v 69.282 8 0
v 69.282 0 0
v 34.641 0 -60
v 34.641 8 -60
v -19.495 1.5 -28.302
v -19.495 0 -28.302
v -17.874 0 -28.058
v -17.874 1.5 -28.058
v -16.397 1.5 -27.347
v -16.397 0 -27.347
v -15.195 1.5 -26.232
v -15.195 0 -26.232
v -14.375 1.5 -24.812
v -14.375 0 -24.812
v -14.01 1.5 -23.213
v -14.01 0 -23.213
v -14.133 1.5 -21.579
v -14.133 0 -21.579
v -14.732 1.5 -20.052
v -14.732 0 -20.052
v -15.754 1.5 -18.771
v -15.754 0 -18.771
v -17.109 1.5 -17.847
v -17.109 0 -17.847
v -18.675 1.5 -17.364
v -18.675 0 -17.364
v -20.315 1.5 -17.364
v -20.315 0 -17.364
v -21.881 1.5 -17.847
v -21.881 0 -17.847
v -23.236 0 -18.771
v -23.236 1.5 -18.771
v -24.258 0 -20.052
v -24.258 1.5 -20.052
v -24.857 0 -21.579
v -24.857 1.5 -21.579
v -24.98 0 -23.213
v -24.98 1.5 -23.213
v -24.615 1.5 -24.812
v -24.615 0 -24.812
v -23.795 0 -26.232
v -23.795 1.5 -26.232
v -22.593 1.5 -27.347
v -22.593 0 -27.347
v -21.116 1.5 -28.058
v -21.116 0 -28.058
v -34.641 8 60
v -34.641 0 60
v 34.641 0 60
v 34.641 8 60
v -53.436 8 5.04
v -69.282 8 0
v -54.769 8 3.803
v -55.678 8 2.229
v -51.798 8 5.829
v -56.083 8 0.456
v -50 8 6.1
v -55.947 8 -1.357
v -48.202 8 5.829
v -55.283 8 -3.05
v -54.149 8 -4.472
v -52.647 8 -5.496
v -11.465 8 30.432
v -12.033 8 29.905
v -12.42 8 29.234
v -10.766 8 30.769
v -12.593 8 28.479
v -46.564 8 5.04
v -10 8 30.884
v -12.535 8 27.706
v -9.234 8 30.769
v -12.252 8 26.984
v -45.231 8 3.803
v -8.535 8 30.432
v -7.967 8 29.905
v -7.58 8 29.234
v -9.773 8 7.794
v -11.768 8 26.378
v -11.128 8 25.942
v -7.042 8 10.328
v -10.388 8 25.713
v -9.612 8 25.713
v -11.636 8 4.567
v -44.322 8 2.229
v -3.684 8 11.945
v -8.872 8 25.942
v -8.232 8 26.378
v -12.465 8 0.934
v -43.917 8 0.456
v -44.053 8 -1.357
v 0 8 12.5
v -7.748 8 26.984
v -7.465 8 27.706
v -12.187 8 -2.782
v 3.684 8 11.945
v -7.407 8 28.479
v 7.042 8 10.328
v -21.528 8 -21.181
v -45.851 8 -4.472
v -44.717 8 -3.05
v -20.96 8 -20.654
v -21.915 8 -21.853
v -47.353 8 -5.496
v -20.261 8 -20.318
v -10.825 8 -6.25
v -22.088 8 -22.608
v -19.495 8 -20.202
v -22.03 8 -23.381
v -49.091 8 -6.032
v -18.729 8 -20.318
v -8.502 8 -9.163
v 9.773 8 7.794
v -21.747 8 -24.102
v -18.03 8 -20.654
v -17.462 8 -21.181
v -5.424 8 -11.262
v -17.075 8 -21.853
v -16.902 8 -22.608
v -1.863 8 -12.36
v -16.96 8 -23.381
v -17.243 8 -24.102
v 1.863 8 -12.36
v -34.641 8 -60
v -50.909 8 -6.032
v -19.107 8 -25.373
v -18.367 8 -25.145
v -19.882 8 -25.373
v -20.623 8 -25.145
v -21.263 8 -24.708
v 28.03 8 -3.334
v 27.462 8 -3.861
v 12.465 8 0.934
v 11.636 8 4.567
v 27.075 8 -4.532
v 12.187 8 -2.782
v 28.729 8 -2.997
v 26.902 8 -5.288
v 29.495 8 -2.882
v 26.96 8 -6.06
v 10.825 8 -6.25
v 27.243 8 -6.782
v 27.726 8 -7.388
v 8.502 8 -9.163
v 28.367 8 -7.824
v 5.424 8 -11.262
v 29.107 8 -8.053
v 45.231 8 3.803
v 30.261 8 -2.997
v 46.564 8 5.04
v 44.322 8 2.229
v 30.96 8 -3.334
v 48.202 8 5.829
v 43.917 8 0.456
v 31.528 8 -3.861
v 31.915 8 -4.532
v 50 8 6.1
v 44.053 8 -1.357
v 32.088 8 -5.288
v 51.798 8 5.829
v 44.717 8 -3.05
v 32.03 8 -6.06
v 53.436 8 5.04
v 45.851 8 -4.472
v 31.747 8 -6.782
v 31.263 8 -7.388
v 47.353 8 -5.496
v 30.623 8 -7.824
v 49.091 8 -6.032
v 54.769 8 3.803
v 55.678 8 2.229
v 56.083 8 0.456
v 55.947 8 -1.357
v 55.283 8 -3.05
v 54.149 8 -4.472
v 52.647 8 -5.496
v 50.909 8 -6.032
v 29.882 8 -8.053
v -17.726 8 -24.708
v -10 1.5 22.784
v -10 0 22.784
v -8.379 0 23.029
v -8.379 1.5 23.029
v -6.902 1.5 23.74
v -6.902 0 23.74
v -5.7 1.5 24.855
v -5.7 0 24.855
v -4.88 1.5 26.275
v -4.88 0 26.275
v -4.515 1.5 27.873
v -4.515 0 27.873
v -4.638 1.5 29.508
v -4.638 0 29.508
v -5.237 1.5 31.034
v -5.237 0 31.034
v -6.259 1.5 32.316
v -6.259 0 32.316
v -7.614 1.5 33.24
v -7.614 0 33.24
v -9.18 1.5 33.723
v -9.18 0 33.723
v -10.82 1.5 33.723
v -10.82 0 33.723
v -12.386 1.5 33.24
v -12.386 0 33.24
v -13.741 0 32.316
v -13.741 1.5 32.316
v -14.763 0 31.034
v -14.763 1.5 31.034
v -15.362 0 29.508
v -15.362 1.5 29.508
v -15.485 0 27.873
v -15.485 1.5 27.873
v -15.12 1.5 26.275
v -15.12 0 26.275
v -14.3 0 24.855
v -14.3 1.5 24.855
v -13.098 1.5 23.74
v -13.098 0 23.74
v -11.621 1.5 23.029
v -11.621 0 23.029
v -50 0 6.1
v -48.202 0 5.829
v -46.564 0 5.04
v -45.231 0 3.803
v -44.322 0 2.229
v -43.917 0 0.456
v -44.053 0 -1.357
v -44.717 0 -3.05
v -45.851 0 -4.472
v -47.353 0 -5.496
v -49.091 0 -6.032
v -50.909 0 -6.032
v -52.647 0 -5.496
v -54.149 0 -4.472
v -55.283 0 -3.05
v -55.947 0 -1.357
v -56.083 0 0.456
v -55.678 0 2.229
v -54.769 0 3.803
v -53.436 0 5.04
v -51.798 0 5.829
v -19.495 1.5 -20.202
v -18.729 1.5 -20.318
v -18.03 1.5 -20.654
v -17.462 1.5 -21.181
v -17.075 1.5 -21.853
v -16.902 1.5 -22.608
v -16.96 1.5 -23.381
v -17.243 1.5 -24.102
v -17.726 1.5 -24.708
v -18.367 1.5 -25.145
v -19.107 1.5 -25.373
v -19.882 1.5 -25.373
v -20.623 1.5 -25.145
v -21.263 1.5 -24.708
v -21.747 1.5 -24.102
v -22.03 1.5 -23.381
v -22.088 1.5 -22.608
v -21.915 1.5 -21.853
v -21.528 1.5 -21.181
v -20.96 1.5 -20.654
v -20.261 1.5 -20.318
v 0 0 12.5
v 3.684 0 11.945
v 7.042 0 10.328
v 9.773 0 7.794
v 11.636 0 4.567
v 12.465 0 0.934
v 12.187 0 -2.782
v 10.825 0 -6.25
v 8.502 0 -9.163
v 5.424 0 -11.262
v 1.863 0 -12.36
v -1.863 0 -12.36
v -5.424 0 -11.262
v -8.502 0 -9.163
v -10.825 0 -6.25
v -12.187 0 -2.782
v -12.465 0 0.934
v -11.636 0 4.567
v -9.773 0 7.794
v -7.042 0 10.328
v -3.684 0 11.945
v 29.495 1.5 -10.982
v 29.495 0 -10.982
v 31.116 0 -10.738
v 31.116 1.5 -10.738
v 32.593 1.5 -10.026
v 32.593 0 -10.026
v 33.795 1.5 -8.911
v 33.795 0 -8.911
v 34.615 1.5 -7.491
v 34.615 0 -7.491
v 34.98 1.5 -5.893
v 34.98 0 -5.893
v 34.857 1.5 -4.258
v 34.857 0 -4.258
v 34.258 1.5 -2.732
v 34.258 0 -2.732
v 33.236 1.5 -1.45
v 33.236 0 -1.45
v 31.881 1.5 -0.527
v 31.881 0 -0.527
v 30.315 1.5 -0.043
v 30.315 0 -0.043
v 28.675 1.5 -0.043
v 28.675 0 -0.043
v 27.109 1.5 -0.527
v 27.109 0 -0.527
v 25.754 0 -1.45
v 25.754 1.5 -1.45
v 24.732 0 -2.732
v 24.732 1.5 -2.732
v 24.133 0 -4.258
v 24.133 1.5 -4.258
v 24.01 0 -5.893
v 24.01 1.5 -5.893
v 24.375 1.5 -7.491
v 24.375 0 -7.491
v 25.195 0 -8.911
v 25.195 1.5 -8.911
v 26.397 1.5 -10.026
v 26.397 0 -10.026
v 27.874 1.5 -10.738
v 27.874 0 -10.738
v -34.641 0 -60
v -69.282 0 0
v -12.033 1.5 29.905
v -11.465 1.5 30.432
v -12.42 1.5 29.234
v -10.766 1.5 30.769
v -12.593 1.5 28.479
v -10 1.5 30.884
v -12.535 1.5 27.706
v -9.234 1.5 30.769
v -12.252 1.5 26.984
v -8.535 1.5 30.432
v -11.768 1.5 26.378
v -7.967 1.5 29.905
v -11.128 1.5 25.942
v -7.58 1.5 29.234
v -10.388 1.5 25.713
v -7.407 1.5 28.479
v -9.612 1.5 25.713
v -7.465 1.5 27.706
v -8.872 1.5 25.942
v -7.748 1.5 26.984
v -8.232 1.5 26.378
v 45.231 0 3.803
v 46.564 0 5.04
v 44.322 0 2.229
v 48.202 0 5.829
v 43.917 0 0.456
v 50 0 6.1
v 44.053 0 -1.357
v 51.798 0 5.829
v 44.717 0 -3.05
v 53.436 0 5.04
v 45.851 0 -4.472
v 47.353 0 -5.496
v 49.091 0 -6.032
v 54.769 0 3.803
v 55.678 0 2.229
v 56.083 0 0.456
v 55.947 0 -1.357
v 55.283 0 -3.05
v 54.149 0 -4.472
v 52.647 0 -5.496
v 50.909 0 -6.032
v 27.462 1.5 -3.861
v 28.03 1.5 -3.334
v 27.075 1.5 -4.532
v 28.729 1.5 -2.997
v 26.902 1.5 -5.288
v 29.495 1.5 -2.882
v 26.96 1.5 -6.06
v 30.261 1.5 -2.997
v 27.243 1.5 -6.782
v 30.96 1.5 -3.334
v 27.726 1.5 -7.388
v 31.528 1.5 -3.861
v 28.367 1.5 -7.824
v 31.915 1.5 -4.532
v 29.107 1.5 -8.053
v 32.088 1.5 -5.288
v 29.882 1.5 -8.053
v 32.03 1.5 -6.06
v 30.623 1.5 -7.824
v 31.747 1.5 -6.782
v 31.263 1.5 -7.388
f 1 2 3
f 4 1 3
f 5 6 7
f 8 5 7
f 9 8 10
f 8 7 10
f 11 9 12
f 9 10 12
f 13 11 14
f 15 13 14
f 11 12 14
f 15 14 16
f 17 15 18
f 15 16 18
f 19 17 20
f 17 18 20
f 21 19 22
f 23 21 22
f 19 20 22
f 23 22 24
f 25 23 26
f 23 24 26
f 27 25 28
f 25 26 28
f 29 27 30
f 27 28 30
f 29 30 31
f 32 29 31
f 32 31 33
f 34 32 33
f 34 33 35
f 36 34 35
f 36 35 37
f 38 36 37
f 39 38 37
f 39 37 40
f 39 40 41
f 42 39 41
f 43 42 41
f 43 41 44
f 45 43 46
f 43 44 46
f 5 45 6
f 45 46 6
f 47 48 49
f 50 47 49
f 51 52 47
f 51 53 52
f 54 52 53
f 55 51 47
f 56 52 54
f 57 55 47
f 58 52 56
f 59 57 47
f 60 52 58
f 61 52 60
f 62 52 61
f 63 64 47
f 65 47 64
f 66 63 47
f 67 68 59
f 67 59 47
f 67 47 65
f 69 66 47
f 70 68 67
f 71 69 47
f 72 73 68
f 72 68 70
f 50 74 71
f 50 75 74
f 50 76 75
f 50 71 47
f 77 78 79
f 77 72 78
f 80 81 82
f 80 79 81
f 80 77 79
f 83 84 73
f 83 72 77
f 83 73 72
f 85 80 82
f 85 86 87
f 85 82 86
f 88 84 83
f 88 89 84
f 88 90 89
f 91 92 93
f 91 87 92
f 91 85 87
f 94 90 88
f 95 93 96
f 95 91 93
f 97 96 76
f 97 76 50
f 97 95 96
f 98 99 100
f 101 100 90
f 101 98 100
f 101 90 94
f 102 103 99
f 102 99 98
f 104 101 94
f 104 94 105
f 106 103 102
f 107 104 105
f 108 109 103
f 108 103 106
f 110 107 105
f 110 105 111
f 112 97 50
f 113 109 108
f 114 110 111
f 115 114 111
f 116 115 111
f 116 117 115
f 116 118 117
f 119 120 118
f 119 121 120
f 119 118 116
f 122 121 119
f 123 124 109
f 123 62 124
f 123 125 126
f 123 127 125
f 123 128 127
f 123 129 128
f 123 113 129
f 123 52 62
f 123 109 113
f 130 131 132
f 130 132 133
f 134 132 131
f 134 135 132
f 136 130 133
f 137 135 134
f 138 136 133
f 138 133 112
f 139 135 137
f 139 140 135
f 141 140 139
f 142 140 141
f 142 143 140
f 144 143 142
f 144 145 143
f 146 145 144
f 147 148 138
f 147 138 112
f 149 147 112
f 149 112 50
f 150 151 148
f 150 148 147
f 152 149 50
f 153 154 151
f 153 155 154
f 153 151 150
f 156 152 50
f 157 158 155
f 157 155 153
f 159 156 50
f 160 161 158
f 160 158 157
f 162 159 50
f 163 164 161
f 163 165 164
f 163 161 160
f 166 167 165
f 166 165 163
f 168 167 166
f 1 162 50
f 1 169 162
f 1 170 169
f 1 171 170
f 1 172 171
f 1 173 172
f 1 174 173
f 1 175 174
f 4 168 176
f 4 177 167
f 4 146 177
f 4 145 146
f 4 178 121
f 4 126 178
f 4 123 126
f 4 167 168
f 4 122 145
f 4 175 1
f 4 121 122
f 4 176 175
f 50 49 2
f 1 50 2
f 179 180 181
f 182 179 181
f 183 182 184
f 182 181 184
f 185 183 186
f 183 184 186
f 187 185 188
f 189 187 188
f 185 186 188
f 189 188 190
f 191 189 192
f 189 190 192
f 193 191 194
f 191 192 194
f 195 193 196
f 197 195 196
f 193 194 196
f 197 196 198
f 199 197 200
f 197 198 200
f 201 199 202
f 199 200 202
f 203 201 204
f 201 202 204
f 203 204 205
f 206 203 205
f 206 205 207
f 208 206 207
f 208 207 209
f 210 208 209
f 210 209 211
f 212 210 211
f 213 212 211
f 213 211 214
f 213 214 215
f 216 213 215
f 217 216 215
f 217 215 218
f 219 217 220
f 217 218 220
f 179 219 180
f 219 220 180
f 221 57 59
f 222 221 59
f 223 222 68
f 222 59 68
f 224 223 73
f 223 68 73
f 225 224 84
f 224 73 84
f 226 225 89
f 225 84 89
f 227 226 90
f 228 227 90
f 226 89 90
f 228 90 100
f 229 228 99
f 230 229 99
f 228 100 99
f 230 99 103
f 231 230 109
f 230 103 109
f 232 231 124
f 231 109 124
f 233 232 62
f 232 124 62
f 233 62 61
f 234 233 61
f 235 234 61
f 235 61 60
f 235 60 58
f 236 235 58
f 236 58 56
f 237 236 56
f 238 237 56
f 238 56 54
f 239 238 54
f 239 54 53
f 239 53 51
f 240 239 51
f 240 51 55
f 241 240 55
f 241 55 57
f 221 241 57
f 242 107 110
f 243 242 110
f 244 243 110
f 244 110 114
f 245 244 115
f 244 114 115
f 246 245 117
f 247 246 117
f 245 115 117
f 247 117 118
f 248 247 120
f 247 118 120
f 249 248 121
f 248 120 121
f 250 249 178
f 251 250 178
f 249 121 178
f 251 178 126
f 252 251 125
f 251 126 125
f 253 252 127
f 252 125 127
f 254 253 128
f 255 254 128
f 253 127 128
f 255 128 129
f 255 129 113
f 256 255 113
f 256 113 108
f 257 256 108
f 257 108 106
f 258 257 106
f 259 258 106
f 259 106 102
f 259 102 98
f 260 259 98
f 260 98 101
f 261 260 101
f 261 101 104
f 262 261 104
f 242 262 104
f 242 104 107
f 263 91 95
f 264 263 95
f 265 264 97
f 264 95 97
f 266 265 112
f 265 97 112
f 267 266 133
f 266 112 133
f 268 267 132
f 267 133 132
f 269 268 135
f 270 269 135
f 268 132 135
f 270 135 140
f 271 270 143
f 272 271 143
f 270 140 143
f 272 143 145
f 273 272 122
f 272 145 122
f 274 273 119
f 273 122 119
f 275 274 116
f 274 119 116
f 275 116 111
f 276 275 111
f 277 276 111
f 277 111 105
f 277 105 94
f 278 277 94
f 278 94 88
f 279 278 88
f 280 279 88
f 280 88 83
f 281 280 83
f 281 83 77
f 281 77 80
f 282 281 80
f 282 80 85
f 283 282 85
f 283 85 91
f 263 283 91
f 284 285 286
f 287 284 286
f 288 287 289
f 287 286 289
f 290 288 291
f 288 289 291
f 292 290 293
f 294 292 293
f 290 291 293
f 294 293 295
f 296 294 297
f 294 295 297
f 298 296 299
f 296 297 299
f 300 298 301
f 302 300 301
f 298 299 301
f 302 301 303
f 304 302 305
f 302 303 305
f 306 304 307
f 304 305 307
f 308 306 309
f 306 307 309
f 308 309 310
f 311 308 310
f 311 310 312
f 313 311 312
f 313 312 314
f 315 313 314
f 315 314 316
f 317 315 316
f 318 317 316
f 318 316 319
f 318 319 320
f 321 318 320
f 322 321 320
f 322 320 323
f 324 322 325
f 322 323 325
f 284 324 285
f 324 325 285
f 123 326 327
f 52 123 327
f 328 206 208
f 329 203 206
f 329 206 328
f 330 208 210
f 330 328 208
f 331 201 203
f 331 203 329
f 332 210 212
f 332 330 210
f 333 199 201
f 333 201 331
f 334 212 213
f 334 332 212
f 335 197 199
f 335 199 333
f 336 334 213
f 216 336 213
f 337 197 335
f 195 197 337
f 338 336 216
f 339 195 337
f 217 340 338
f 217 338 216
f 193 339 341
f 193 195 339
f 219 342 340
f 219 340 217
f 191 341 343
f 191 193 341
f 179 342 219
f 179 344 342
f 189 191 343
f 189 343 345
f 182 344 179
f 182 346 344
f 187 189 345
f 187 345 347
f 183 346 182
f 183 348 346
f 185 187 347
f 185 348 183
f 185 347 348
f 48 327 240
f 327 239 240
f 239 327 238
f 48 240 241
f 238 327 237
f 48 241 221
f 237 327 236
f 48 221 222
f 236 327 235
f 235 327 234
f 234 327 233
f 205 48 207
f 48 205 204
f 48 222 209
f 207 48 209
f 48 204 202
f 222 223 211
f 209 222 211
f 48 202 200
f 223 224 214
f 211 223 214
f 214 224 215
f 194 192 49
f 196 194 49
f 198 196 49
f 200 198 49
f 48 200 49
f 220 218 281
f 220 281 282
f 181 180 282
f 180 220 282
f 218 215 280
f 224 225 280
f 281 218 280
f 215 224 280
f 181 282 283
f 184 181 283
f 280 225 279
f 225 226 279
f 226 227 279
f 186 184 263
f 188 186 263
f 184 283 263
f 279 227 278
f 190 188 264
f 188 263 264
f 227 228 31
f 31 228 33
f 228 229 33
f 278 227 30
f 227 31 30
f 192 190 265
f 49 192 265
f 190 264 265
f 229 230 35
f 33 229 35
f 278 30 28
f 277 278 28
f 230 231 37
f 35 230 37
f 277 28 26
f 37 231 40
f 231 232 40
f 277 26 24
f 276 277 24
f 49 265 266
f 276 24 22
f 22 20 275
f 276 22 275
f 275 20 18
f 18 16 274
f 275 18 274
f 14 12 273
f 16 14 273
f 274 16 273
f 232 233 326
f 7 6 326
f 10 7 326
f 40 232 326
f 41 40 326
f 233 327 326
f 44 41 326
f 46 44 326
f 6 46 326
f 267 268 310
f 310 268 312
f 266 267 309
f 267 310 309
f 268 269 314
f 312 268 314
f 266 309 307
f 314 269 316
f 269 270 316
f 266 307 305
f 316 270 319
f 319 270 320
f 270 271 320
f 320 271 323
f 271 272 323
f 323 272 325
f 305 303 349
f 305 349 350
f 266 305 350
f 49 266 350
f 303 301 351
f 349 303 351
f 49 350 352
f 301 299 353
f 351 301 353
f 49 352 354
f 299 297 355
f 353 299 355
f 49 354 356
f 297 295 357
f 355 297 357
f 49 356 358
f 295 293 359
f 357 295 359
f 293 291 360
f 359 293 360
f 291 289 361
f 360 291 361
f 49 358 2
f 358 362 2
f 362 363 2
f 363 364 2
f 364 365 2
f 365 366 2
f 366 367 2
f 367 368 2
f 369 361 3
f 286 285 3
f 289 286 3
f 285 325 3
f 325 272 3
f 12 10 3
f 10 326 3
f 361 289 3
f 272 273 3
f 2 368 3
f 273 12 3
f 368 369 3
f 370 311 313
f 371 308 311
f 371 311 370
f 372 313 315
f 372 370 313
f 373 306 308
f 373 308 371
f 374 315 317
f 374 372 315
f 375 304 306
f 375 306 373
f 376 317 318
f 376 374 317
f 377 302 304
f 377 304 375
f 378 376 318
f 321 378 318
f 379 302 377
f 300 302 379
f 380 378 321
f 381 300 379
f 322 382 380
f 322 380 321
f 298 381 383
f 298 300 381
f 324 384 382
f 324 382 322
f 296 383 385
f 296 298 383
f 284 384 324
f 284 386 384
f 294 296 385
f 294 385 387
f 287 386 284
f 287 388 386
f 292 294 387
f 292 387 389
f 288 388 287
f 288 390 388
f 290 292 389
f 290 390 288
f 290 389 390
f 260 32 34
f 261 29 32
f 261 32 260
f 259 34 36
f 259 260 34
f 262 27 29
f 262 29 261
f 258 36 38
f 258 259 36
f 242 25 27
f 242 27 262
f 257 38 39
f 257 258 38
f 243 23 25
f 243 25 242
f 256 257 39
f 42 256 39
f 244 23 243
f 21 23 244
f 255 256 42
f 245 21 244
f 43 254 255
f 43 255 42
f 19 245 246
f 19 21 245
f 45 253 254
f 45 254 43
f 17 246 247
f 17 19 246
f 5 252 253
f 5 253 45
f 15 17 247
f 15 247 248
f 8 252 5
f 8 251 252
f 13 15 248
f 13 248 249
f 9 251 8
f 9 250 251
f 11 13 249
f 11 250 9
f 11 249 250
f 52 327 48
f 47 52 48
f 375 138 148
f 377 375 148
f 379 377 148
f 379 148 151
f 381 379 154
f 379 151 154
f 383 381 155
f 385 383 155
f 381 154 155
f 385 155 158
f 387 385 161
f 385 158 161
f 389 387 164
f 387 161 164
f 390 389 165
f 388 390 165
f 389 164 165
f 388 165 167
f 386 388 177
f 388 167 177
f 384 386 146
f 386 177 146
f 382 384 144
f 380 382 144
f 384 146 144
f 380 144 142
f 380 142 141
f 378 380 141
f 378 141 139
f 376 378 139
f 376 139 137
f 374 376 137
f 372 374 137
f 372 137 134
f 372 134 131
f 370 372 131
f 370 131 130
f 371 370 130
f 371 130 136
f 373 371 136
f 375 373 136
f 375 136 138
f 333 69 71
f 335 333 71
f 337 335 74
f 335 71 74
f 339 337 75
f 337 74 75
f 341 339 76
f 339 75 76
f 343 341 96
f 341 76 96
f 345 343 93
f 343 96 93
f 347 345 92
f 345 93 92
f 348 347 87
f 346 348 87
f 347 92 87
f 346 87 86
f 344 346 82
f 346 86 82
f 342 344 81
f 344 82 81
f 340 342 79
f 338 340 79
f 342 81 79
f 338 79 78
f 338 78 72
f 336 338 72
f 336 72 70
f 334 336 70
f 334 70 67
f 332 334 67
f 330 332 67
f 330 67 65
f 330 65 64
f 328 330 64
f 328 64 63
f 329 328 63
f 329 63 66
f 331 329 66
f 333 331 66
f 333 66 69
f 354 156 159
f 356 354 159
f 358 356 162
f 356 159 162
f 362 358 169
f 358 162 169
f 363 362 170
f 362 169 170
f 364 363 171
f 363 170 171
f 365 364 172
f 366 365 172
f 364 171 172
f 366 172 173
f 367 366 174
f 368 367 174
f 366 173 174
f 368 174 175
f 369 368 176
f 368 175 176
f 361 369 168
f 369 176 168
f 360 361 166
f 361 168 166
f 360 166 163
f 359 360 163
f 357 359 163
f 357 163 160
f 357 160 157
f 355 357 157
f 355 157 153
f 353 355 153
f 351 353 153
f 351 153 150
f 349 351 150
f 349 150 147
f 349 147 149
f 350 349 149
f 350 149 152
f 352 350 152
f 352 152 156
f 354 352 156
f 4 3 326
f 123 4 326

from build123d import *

# Parameters (mm, degrees)
EXTRUDE_1_DEPTH     = 8
SKETCH_2_R          = 6.1
CUT_EXTRUDE_1_DEPTH = 93
SKETCH_4_R          = 12.5
CUT_EXTRUDE_3_DEPTH = 93
SKETCH_5_R          = 2.6
CUT_EXTRUDE_4_DEPTH = 93
SKETCH_6_R          = 5.5
CUT_EXTRUDE_5_DEPTH = 1.5


with BuildPart() as part:
    # 草图1 → 凸台-拉伸1 (new body)
    with BuildSketch(Plane(origin=(0, 0, 0), x_dir=(1, 0, 0), z_dir=(0, 1, 0))):
        Polygon((69.282032303, 0), (34.641016151, 60), (-34.641016151, 60), (-69.282032303, 0), (-34.641016151, -60), (34.641016151, -60), align=None)
    extrude(amount=EXTRUDE_1_DEPTH)

    # 草图2 → 切除-拉伸1 (cut, through all)
    with BuildSketch(Plane(origin=(0, 8, 0), x_dir=(1, 0, 0), z_dir=(0, 1, 0))):
        with Locations(Location((-50, 0, 0), (0, 0, 270))):
            Circle(SKETCH_2_R)
        with Locations(Location((50, 0, 0), (0, 0, 270))):
            Circle(SKETCH_2_R)
    extrude(amount=-CUT_EXTRUDE_1_DEPTH, mode=Mode.SUBTRACT)

    # 草图4 → 切除-拉伸3 (cut, through all)
    with BuildSketch(Plane(origin=(0, 8, 0), x_dir=(1, 0, 0), z_dir=(0, 1, 0))):
        with Locations(Location((0, 0, 0), (0, 0, 270))):
            Circle(SKETCH_4_R)
    extrude(amount=-CUT_EXTRUDE_3_DEPTH, mode=Mode.SUBTRACT)

    # 草图5 → 切除-拉伸4 (cut, through all)
    with BuildSketch(Plane(origin=(0, 8, 0), x_dir=(1, 0, 0), z_dir=(0, 1, 0))):
        with Locations(Location((-10, -28.284271247, 0), (0, 0, 270))):
            Circle(SKETCH_5_R)
        with Locations(Location((-19.494897428, 22.802389662, 0), (0, 0, 270))):
            Circle(SKETCH_5_R)
        with Locations(Location((29.494897428, 5.481881586, 0), (0, 0, 270))):
            Circle(SKETCH_5_R)
    extrude(amount=-CUT_EXTRUDE_4_DEPTH, mode=Mode.SUBTRACT)

    # 草图6 → 切除-拉伸5 (cut)
    with BuildSketch(Plane.XZ):
        with Locations(Location((-10, 28.284271247, 0), (0, 0, 270))):
            Circle(SKETCH_6_R)
        with Locations(Location((-19.494897428, -22.802389662, 0), (0, 0, 270))):
            Circle(SKETCH_6_R)
        with Locations(Location((29.494897428, -5.481881586, 0), (0, 0, 270))):
            Circle(SKETCH_6_R)
    extrude(amount=-CUT_EXTRUDE_5_DEPTH, mode=Mode.SUBTRACT)


solid = part.part
